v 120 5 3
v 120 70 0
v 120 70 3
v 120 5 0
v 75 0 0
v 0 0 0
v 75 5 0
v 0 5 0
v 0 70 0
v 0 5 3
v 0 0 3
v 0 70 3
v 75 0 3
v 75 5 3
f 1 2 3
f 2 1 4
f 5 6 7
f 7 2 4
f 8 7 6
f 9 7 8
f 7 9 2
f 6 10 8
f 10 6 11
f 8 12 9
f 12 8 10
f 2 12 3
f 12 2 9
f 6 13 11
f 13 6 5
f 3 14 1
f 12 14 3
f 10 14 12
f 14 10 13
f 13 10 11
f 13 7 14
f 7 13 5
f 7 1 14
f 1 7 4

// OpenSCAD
// Open-top rectangular buffer tank for a mini horizontal gel-electrophoresis box, with a
// central raised platform that spans the width and creates two buffer chambers, and
// horizontal electrode holes through each end wall. NOVEL general part.
//

tank_l = 120;
tank_w = 70;
tank_h = 40;
wall   = 3;
floor  = 3;
platform_t = 10;
electrode_d = 2;

$fn = 48;

inner_h = tank_h - wall - floor;
platform_z = floor + platform_t;

difference() {
    cube([tank_l, tank_w, tank_h]);
    translate([0, 0, floor]) cube([tank_l, tank_w, tank_h - floor]);                 // hollow the body except the floor
    translate([0, wall, floor]) cube([tank_l, tank_w - 2 * wall, inner_h]);           // cavity: open top, flat floor
    translate([-(tank_l / 2 - 15), wall, floor]) cube([tank_l / 2 - 15, tank_w - 2 * wall, inner_h]);   // left chamber
    translate([tank_l / 2 + 15, wall, floor]) cube([tank_l / 2 - 15, tank_w - 2 * wall, inner_h]);   // right chamber
    translate([-(tank_l / 2 - 15), 0, -1]) cube([tank_l / 2 - 15, wall + 2, tank_h + 2]);          // left end wall (solid, for the electrode hole)
    translate([tank_l / 2 + 15, 0, -1]) cube([tank_l / 2 - 15, wall + 2, tank_h + 2]);             // right end wall (solid, for the electrode hole)
    for (y = [-(tank_w / 2 - wall), tank_w / 2 - wall])
        translate([0, y, tank_h - 1]) rotate([-90, 0, 0]) cylinder(h = tank_w - 2 * wall + 2, d = electrode_d);   // electrode holes in the end walls
}
